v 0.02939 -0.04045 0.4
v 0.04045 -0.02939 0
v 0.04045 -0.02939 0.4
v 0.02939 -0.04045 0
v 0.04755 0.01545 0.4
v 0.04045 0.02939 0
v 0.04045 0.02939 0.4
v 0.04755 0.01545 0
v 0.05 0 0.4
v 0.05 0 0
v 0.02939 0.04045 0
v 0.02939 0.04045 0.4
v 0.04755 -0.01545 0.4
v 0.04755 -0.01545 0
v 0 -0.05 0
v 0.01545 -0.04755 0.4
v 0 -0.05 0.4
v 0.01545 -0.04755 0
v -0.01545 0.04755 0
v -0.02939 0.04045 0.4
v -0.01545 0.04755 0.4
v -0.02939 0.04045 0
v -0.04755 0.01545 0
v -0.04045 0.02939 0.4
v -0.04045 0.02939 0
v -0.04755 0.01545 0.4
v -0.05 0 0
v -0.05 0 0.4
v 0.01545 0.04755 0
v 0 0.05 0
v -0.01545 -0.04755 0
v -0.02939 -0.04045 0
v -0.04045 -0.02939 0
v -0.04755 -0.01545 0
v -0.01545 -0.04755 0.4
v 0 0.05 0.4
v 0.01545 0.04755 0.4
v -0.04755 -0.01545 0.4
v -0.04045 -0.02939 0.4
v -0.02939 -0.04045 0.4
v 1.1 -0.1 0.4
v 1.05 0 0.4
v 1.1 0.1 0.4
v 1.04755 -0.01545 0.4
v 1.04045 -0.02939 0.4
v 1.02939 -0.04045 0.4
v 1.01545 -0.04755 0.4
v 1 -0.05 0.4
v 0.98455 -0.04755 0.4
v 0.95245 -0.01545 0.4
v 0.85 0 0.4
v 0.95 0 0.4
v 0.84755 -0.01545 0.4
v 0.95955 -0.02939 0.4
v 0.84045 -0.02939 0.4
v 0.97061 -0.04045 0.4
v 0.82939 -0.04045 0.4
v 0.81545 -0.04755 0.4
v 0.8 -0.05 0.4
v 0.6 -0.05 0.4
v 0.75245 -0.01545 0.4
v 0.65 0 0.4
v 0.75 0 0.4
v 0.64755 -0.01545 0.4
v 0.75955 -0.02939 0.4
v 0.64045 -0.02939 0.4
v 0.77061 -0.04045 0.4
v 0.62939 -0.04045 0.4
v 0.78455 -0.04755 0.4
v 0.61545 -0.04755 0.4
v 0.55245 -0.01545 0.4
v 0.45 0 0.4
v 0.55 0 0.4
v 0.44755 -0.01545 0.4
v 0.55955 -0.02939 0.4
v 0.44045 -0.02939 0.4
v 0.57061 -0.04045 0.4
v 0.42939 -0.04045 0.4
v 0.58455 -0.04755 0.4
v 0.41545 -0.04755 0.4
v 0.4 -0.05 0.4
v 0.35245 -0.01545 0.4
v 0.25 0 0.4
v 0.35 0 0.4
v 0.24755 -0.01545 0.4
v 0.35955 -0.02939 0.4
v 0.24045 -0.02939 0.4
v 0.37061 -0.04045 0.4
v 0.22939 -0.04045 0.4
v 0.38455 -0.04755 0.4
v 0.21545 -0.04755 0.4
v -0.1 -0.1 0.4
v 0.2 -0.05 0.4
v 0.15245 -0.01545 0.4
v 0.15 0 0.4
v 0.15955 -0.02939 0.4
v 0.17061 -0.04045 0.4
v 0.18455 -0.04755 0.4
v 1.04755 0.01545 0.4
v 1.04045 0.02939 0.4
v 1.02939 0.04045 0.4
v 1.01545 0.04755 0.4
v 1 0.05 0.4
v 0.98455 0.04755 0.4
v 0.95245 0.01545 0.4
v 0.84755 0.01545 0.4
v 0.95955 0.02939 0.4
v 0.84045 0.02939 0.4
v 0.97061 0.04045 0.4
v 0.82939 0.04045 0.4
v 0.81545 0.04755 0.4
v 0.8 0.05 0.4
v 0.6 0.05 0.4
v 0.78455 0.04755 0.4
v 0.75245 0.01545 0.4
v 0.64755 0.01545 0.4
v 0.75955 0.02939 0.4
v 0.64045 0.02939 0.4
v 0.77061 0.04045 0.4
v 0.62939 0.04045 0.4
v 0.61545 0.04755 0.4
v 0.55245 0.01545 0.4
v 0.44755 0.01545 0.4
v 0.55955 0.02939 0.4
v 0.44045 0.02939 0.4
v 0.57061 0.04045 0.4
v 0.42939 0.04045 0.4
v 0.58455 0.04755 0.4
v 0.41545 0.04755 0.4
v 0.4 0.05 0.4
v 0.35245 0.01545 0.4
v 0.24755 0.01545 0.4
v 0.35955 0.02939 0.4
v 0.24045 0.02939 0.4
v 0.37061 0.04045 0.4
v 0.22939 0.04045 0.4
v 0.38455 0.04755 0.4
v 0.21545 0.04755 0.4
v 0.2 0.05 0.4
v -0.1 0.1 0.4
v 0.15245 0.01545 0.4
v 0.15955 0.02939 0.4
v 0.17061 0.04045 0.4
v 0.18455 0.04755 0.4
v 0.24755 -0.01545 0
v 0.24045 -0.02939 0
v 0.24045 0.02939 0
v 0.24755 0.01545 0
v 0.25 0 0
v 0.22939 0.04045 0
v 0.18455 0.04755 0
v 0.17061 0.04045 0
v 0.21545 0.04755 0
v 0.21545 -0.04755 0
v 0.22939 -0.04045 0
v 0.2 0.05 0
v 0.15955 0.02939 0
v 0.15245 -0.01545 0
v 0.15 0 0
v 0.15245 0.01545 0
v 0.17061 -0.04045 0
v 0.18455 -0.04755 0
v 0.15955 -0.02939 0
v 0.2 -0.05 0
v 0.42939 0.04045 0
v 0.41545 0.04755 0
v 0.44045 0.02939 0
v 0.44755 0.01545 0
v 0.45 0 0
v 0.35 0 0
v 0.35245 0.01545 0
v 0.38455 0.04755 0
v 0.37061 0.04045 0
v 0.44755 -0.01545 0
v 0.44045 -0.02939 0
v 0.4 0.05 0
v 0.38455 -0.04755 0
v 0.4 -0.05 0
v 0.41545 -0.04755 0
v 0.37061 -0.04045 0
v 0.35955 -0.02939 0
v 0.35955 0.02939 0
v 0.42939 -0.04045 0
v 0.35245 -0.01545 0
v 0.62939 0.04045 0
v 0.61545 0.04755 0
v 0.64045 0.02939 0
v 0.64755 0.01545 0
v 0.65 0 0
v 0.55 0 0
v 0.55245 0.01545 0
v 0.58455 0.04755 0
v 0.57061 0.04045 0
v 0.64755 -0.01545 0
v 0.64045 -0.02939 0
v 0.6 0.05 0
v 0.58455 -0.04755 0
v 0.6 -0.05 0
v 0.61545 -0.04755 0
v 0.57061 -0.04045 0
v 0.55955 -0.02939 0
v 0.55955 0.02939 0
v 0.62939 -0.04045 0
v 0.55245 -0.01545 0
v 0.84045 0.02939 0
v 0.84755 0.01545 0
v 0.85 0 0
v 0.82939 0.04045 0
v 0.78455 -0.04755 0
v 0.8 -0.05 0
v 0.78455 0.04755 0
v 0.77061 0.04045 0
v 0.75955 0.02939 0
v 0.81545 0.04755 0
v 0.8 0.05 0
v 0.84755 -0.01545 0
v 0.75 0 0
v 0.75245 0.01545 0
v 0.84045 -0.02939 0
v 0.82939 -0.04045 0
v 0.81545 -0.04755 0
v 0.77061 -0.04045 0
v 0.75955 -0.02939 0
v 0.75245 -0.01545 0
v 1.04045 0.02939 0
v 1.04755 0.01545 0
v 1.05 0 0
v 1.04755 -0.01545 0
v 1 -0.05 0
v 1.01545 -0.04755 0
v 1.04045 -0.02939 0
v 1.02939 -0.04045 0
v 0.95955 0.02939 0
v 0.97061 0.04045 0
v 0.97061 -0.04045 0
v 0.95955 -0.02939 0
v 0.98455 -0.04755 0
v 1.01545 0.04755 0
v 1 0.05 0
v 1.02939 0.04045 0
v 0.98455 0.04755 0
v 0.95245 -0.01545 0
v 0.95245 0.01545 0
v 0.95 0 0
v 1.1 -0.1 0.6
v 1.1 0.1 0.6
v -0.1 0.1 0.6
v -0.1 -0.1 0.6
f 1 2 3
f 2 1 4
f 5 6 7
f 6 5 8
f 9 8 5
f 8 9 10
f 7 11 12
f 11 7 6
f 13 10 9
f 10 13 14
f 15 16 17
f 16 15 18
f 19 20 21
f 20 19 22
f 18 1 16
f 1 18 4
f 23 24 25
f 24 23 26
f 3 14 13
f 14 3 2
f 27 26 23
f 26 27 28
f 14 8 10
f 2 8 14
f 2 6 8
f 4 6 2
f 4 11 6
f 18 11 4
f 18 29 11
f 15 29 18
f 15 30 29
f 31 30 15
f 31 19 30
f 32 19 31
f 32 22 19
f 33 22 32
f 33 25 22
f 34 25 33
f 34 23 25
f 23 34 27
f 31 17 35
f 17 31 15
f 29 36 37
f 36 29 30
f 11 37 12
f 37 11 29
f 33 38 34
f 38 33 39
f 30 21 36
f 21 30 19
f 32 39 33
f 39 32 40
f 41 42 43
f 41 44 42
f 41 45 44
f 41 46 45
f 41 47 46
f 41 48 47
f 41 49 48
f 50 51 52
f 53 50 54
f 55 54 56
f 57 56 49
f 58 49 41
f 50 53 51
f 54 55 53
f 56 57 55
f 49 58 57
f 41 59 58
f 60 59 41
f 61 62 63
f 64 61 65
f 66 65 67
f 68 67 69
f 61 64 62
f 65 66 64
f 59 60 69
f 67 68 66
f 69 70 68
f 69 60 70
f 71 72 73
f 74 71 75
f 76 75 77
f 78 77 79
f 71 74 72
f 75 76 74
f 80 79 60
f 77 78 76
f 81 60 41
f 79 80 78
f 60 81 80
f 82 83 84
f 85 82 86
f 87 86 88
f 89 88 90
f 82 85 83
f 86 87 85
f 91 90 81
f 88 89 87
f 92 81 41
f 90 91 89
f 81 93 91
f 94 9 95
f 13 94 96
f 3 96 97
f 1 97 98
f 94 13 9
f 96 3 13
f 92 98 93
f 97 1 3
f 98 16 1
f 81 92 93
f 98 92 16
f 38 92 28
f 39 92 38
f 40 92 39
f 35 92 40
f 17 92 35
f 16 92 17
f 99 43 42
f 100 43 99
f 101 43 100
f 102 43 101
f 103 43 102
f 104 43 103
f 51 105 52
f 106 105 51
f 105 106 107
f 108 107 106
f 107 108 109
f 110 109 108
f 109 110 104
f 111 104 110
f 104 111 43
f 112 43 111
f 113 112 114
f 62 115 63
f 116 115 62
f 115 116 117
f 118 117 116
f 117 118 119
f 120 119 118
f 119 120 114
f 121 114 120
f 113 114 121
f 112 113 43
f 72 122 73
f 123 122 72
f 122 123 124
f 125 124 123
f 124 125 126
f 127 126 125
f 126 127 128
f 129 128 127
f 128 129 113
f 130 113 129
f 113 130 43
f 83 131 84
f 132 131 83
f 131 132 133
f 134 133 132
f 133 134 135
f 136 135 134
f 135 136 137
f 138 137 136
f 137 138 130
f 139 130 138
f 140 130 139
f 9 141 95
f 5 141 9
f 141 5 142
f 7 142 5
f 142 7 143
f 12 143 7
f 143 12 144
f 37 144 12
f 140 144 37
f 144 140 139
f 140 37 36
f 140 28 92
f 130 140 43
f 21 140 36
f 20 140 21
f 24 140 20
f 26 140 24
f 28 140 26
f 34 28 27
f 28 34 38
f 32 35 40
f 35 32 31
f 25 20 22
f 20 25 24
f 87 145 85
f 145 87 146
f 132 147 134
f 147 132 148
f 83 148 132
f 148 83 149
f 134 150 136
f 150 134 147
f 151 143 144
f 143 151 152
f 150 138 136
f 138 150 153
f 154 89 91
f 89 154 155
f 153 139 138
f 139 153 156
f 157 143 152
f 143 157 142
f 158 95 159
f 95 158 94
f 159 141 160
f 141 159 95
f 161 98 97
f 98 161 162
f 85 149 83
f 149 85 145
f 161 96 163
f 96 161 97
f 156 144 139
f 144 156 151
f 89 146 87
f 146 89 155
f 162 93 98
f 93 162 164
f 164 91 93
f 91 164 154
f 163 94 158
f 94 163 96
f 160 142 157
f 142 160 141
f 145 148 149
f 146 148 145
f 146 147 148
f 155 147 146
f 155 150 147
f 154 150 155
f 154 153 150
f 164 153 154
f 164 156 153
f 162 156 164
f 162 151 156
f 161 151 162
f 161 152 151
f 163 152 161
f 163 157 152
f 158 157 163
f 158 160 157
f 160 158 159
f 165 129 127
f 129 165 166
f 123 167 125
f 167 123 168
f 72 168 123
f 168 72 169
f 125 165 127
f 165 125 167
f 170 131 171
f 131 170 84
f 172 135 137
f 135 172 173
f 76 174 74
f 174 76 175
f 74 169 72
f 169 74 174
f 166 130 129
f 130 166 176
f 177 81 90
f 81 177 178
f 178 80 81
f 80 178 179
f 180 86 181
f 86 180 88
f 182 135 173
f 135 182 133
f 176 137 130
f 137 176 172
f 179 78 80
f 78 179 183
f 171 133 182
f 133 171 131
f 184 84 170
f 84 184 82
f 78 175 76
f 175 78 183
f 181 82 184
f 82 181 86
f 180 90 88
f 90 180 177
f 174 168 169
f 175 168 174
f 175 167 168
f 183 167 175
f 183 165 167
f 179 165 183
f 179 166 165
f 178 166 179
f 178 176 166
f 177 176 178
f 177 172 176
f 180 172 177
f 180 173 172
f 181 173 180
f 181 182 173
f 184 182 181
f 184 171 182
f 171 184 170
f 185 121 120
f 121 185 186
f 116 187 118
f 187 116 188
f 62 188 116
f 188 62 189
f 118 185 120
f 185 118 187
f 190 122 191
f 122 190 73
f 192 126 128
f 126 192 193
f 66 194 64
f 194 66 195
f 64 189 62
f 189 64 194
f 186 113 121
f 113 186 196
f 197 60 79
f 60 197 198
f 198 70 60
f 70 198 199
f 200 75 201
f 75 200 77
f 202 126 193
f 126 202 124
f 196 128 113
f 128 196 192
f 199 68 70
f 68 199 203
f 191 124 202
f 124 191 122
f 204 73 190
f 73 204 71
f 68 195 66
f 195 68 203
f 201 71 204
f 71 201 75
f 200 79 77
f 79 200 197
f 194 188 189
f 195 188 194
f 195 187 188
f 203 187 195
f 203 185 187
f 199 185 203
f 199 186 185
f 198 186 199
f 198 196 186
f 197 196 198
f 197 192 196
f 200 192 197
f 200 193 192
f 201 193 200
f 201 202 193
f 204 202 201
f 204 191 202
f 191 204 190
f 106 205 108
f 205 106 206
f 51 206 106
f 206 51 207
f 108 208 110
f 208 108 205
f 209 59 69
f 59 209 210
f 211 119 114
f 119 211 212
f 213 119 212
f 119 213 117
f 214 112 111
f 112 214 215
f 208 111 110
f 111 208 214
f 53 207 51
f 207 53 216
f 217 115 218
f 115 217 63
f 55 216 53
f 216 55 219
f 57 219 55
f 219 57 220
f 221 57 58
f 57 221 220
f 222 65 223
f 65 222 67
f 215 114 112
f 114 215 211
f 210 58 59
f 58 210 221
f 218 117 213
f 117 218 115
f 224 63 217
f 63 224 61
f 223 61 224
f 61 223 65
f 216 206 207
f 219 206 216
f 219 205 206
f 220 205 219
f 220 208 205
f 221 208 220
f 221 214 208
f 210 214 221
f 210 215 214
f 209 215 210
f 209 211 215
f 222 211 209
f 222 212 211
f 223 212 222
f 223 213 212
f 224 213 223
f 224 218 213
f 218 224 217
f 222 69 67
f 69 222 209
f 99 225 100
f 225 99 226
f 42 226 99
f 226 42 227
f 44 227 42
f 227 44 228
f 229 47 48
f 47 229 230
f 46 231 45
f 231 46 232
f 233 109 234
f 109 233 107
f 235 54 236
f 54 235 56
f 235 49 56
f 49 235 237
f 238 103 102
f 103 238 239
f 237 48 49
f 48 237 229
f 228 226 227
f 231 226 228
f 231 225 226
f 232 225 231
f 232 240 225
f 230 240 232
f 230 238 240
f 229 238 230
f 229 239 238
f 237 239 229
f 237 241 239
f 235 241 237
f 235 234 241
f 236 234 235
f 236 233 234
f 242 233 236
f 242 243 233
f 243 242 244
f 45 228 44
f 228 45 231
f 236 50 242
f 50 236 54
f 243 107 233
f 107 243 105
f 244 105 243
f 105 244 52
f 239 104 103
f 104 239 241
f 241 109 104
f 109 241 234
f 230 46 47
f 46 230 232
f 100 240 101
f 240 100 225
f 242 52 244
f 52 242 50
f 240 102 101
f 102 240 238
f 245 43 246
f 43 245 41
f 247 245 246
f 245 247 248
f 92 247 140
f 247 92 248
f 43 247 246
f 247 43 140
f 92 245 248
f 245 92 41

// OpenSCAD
// Railing

module railing(length, height, post_radius, rail_radius) {

    // Posts
    for (i = [0:0.2:1]) {
        translate([i * length, 0, 0]) {
            cylinder(h = height, r = post_radius, $fn = 20);
        }
    }

    translate([-.1, -.1, height])
    cube([1.2, .2, .2]);
}

color([0.3, 0.3, 0.5])
railing(length = 1, height = .4, post_radius = 0.05, rail_radius = 0.03);
